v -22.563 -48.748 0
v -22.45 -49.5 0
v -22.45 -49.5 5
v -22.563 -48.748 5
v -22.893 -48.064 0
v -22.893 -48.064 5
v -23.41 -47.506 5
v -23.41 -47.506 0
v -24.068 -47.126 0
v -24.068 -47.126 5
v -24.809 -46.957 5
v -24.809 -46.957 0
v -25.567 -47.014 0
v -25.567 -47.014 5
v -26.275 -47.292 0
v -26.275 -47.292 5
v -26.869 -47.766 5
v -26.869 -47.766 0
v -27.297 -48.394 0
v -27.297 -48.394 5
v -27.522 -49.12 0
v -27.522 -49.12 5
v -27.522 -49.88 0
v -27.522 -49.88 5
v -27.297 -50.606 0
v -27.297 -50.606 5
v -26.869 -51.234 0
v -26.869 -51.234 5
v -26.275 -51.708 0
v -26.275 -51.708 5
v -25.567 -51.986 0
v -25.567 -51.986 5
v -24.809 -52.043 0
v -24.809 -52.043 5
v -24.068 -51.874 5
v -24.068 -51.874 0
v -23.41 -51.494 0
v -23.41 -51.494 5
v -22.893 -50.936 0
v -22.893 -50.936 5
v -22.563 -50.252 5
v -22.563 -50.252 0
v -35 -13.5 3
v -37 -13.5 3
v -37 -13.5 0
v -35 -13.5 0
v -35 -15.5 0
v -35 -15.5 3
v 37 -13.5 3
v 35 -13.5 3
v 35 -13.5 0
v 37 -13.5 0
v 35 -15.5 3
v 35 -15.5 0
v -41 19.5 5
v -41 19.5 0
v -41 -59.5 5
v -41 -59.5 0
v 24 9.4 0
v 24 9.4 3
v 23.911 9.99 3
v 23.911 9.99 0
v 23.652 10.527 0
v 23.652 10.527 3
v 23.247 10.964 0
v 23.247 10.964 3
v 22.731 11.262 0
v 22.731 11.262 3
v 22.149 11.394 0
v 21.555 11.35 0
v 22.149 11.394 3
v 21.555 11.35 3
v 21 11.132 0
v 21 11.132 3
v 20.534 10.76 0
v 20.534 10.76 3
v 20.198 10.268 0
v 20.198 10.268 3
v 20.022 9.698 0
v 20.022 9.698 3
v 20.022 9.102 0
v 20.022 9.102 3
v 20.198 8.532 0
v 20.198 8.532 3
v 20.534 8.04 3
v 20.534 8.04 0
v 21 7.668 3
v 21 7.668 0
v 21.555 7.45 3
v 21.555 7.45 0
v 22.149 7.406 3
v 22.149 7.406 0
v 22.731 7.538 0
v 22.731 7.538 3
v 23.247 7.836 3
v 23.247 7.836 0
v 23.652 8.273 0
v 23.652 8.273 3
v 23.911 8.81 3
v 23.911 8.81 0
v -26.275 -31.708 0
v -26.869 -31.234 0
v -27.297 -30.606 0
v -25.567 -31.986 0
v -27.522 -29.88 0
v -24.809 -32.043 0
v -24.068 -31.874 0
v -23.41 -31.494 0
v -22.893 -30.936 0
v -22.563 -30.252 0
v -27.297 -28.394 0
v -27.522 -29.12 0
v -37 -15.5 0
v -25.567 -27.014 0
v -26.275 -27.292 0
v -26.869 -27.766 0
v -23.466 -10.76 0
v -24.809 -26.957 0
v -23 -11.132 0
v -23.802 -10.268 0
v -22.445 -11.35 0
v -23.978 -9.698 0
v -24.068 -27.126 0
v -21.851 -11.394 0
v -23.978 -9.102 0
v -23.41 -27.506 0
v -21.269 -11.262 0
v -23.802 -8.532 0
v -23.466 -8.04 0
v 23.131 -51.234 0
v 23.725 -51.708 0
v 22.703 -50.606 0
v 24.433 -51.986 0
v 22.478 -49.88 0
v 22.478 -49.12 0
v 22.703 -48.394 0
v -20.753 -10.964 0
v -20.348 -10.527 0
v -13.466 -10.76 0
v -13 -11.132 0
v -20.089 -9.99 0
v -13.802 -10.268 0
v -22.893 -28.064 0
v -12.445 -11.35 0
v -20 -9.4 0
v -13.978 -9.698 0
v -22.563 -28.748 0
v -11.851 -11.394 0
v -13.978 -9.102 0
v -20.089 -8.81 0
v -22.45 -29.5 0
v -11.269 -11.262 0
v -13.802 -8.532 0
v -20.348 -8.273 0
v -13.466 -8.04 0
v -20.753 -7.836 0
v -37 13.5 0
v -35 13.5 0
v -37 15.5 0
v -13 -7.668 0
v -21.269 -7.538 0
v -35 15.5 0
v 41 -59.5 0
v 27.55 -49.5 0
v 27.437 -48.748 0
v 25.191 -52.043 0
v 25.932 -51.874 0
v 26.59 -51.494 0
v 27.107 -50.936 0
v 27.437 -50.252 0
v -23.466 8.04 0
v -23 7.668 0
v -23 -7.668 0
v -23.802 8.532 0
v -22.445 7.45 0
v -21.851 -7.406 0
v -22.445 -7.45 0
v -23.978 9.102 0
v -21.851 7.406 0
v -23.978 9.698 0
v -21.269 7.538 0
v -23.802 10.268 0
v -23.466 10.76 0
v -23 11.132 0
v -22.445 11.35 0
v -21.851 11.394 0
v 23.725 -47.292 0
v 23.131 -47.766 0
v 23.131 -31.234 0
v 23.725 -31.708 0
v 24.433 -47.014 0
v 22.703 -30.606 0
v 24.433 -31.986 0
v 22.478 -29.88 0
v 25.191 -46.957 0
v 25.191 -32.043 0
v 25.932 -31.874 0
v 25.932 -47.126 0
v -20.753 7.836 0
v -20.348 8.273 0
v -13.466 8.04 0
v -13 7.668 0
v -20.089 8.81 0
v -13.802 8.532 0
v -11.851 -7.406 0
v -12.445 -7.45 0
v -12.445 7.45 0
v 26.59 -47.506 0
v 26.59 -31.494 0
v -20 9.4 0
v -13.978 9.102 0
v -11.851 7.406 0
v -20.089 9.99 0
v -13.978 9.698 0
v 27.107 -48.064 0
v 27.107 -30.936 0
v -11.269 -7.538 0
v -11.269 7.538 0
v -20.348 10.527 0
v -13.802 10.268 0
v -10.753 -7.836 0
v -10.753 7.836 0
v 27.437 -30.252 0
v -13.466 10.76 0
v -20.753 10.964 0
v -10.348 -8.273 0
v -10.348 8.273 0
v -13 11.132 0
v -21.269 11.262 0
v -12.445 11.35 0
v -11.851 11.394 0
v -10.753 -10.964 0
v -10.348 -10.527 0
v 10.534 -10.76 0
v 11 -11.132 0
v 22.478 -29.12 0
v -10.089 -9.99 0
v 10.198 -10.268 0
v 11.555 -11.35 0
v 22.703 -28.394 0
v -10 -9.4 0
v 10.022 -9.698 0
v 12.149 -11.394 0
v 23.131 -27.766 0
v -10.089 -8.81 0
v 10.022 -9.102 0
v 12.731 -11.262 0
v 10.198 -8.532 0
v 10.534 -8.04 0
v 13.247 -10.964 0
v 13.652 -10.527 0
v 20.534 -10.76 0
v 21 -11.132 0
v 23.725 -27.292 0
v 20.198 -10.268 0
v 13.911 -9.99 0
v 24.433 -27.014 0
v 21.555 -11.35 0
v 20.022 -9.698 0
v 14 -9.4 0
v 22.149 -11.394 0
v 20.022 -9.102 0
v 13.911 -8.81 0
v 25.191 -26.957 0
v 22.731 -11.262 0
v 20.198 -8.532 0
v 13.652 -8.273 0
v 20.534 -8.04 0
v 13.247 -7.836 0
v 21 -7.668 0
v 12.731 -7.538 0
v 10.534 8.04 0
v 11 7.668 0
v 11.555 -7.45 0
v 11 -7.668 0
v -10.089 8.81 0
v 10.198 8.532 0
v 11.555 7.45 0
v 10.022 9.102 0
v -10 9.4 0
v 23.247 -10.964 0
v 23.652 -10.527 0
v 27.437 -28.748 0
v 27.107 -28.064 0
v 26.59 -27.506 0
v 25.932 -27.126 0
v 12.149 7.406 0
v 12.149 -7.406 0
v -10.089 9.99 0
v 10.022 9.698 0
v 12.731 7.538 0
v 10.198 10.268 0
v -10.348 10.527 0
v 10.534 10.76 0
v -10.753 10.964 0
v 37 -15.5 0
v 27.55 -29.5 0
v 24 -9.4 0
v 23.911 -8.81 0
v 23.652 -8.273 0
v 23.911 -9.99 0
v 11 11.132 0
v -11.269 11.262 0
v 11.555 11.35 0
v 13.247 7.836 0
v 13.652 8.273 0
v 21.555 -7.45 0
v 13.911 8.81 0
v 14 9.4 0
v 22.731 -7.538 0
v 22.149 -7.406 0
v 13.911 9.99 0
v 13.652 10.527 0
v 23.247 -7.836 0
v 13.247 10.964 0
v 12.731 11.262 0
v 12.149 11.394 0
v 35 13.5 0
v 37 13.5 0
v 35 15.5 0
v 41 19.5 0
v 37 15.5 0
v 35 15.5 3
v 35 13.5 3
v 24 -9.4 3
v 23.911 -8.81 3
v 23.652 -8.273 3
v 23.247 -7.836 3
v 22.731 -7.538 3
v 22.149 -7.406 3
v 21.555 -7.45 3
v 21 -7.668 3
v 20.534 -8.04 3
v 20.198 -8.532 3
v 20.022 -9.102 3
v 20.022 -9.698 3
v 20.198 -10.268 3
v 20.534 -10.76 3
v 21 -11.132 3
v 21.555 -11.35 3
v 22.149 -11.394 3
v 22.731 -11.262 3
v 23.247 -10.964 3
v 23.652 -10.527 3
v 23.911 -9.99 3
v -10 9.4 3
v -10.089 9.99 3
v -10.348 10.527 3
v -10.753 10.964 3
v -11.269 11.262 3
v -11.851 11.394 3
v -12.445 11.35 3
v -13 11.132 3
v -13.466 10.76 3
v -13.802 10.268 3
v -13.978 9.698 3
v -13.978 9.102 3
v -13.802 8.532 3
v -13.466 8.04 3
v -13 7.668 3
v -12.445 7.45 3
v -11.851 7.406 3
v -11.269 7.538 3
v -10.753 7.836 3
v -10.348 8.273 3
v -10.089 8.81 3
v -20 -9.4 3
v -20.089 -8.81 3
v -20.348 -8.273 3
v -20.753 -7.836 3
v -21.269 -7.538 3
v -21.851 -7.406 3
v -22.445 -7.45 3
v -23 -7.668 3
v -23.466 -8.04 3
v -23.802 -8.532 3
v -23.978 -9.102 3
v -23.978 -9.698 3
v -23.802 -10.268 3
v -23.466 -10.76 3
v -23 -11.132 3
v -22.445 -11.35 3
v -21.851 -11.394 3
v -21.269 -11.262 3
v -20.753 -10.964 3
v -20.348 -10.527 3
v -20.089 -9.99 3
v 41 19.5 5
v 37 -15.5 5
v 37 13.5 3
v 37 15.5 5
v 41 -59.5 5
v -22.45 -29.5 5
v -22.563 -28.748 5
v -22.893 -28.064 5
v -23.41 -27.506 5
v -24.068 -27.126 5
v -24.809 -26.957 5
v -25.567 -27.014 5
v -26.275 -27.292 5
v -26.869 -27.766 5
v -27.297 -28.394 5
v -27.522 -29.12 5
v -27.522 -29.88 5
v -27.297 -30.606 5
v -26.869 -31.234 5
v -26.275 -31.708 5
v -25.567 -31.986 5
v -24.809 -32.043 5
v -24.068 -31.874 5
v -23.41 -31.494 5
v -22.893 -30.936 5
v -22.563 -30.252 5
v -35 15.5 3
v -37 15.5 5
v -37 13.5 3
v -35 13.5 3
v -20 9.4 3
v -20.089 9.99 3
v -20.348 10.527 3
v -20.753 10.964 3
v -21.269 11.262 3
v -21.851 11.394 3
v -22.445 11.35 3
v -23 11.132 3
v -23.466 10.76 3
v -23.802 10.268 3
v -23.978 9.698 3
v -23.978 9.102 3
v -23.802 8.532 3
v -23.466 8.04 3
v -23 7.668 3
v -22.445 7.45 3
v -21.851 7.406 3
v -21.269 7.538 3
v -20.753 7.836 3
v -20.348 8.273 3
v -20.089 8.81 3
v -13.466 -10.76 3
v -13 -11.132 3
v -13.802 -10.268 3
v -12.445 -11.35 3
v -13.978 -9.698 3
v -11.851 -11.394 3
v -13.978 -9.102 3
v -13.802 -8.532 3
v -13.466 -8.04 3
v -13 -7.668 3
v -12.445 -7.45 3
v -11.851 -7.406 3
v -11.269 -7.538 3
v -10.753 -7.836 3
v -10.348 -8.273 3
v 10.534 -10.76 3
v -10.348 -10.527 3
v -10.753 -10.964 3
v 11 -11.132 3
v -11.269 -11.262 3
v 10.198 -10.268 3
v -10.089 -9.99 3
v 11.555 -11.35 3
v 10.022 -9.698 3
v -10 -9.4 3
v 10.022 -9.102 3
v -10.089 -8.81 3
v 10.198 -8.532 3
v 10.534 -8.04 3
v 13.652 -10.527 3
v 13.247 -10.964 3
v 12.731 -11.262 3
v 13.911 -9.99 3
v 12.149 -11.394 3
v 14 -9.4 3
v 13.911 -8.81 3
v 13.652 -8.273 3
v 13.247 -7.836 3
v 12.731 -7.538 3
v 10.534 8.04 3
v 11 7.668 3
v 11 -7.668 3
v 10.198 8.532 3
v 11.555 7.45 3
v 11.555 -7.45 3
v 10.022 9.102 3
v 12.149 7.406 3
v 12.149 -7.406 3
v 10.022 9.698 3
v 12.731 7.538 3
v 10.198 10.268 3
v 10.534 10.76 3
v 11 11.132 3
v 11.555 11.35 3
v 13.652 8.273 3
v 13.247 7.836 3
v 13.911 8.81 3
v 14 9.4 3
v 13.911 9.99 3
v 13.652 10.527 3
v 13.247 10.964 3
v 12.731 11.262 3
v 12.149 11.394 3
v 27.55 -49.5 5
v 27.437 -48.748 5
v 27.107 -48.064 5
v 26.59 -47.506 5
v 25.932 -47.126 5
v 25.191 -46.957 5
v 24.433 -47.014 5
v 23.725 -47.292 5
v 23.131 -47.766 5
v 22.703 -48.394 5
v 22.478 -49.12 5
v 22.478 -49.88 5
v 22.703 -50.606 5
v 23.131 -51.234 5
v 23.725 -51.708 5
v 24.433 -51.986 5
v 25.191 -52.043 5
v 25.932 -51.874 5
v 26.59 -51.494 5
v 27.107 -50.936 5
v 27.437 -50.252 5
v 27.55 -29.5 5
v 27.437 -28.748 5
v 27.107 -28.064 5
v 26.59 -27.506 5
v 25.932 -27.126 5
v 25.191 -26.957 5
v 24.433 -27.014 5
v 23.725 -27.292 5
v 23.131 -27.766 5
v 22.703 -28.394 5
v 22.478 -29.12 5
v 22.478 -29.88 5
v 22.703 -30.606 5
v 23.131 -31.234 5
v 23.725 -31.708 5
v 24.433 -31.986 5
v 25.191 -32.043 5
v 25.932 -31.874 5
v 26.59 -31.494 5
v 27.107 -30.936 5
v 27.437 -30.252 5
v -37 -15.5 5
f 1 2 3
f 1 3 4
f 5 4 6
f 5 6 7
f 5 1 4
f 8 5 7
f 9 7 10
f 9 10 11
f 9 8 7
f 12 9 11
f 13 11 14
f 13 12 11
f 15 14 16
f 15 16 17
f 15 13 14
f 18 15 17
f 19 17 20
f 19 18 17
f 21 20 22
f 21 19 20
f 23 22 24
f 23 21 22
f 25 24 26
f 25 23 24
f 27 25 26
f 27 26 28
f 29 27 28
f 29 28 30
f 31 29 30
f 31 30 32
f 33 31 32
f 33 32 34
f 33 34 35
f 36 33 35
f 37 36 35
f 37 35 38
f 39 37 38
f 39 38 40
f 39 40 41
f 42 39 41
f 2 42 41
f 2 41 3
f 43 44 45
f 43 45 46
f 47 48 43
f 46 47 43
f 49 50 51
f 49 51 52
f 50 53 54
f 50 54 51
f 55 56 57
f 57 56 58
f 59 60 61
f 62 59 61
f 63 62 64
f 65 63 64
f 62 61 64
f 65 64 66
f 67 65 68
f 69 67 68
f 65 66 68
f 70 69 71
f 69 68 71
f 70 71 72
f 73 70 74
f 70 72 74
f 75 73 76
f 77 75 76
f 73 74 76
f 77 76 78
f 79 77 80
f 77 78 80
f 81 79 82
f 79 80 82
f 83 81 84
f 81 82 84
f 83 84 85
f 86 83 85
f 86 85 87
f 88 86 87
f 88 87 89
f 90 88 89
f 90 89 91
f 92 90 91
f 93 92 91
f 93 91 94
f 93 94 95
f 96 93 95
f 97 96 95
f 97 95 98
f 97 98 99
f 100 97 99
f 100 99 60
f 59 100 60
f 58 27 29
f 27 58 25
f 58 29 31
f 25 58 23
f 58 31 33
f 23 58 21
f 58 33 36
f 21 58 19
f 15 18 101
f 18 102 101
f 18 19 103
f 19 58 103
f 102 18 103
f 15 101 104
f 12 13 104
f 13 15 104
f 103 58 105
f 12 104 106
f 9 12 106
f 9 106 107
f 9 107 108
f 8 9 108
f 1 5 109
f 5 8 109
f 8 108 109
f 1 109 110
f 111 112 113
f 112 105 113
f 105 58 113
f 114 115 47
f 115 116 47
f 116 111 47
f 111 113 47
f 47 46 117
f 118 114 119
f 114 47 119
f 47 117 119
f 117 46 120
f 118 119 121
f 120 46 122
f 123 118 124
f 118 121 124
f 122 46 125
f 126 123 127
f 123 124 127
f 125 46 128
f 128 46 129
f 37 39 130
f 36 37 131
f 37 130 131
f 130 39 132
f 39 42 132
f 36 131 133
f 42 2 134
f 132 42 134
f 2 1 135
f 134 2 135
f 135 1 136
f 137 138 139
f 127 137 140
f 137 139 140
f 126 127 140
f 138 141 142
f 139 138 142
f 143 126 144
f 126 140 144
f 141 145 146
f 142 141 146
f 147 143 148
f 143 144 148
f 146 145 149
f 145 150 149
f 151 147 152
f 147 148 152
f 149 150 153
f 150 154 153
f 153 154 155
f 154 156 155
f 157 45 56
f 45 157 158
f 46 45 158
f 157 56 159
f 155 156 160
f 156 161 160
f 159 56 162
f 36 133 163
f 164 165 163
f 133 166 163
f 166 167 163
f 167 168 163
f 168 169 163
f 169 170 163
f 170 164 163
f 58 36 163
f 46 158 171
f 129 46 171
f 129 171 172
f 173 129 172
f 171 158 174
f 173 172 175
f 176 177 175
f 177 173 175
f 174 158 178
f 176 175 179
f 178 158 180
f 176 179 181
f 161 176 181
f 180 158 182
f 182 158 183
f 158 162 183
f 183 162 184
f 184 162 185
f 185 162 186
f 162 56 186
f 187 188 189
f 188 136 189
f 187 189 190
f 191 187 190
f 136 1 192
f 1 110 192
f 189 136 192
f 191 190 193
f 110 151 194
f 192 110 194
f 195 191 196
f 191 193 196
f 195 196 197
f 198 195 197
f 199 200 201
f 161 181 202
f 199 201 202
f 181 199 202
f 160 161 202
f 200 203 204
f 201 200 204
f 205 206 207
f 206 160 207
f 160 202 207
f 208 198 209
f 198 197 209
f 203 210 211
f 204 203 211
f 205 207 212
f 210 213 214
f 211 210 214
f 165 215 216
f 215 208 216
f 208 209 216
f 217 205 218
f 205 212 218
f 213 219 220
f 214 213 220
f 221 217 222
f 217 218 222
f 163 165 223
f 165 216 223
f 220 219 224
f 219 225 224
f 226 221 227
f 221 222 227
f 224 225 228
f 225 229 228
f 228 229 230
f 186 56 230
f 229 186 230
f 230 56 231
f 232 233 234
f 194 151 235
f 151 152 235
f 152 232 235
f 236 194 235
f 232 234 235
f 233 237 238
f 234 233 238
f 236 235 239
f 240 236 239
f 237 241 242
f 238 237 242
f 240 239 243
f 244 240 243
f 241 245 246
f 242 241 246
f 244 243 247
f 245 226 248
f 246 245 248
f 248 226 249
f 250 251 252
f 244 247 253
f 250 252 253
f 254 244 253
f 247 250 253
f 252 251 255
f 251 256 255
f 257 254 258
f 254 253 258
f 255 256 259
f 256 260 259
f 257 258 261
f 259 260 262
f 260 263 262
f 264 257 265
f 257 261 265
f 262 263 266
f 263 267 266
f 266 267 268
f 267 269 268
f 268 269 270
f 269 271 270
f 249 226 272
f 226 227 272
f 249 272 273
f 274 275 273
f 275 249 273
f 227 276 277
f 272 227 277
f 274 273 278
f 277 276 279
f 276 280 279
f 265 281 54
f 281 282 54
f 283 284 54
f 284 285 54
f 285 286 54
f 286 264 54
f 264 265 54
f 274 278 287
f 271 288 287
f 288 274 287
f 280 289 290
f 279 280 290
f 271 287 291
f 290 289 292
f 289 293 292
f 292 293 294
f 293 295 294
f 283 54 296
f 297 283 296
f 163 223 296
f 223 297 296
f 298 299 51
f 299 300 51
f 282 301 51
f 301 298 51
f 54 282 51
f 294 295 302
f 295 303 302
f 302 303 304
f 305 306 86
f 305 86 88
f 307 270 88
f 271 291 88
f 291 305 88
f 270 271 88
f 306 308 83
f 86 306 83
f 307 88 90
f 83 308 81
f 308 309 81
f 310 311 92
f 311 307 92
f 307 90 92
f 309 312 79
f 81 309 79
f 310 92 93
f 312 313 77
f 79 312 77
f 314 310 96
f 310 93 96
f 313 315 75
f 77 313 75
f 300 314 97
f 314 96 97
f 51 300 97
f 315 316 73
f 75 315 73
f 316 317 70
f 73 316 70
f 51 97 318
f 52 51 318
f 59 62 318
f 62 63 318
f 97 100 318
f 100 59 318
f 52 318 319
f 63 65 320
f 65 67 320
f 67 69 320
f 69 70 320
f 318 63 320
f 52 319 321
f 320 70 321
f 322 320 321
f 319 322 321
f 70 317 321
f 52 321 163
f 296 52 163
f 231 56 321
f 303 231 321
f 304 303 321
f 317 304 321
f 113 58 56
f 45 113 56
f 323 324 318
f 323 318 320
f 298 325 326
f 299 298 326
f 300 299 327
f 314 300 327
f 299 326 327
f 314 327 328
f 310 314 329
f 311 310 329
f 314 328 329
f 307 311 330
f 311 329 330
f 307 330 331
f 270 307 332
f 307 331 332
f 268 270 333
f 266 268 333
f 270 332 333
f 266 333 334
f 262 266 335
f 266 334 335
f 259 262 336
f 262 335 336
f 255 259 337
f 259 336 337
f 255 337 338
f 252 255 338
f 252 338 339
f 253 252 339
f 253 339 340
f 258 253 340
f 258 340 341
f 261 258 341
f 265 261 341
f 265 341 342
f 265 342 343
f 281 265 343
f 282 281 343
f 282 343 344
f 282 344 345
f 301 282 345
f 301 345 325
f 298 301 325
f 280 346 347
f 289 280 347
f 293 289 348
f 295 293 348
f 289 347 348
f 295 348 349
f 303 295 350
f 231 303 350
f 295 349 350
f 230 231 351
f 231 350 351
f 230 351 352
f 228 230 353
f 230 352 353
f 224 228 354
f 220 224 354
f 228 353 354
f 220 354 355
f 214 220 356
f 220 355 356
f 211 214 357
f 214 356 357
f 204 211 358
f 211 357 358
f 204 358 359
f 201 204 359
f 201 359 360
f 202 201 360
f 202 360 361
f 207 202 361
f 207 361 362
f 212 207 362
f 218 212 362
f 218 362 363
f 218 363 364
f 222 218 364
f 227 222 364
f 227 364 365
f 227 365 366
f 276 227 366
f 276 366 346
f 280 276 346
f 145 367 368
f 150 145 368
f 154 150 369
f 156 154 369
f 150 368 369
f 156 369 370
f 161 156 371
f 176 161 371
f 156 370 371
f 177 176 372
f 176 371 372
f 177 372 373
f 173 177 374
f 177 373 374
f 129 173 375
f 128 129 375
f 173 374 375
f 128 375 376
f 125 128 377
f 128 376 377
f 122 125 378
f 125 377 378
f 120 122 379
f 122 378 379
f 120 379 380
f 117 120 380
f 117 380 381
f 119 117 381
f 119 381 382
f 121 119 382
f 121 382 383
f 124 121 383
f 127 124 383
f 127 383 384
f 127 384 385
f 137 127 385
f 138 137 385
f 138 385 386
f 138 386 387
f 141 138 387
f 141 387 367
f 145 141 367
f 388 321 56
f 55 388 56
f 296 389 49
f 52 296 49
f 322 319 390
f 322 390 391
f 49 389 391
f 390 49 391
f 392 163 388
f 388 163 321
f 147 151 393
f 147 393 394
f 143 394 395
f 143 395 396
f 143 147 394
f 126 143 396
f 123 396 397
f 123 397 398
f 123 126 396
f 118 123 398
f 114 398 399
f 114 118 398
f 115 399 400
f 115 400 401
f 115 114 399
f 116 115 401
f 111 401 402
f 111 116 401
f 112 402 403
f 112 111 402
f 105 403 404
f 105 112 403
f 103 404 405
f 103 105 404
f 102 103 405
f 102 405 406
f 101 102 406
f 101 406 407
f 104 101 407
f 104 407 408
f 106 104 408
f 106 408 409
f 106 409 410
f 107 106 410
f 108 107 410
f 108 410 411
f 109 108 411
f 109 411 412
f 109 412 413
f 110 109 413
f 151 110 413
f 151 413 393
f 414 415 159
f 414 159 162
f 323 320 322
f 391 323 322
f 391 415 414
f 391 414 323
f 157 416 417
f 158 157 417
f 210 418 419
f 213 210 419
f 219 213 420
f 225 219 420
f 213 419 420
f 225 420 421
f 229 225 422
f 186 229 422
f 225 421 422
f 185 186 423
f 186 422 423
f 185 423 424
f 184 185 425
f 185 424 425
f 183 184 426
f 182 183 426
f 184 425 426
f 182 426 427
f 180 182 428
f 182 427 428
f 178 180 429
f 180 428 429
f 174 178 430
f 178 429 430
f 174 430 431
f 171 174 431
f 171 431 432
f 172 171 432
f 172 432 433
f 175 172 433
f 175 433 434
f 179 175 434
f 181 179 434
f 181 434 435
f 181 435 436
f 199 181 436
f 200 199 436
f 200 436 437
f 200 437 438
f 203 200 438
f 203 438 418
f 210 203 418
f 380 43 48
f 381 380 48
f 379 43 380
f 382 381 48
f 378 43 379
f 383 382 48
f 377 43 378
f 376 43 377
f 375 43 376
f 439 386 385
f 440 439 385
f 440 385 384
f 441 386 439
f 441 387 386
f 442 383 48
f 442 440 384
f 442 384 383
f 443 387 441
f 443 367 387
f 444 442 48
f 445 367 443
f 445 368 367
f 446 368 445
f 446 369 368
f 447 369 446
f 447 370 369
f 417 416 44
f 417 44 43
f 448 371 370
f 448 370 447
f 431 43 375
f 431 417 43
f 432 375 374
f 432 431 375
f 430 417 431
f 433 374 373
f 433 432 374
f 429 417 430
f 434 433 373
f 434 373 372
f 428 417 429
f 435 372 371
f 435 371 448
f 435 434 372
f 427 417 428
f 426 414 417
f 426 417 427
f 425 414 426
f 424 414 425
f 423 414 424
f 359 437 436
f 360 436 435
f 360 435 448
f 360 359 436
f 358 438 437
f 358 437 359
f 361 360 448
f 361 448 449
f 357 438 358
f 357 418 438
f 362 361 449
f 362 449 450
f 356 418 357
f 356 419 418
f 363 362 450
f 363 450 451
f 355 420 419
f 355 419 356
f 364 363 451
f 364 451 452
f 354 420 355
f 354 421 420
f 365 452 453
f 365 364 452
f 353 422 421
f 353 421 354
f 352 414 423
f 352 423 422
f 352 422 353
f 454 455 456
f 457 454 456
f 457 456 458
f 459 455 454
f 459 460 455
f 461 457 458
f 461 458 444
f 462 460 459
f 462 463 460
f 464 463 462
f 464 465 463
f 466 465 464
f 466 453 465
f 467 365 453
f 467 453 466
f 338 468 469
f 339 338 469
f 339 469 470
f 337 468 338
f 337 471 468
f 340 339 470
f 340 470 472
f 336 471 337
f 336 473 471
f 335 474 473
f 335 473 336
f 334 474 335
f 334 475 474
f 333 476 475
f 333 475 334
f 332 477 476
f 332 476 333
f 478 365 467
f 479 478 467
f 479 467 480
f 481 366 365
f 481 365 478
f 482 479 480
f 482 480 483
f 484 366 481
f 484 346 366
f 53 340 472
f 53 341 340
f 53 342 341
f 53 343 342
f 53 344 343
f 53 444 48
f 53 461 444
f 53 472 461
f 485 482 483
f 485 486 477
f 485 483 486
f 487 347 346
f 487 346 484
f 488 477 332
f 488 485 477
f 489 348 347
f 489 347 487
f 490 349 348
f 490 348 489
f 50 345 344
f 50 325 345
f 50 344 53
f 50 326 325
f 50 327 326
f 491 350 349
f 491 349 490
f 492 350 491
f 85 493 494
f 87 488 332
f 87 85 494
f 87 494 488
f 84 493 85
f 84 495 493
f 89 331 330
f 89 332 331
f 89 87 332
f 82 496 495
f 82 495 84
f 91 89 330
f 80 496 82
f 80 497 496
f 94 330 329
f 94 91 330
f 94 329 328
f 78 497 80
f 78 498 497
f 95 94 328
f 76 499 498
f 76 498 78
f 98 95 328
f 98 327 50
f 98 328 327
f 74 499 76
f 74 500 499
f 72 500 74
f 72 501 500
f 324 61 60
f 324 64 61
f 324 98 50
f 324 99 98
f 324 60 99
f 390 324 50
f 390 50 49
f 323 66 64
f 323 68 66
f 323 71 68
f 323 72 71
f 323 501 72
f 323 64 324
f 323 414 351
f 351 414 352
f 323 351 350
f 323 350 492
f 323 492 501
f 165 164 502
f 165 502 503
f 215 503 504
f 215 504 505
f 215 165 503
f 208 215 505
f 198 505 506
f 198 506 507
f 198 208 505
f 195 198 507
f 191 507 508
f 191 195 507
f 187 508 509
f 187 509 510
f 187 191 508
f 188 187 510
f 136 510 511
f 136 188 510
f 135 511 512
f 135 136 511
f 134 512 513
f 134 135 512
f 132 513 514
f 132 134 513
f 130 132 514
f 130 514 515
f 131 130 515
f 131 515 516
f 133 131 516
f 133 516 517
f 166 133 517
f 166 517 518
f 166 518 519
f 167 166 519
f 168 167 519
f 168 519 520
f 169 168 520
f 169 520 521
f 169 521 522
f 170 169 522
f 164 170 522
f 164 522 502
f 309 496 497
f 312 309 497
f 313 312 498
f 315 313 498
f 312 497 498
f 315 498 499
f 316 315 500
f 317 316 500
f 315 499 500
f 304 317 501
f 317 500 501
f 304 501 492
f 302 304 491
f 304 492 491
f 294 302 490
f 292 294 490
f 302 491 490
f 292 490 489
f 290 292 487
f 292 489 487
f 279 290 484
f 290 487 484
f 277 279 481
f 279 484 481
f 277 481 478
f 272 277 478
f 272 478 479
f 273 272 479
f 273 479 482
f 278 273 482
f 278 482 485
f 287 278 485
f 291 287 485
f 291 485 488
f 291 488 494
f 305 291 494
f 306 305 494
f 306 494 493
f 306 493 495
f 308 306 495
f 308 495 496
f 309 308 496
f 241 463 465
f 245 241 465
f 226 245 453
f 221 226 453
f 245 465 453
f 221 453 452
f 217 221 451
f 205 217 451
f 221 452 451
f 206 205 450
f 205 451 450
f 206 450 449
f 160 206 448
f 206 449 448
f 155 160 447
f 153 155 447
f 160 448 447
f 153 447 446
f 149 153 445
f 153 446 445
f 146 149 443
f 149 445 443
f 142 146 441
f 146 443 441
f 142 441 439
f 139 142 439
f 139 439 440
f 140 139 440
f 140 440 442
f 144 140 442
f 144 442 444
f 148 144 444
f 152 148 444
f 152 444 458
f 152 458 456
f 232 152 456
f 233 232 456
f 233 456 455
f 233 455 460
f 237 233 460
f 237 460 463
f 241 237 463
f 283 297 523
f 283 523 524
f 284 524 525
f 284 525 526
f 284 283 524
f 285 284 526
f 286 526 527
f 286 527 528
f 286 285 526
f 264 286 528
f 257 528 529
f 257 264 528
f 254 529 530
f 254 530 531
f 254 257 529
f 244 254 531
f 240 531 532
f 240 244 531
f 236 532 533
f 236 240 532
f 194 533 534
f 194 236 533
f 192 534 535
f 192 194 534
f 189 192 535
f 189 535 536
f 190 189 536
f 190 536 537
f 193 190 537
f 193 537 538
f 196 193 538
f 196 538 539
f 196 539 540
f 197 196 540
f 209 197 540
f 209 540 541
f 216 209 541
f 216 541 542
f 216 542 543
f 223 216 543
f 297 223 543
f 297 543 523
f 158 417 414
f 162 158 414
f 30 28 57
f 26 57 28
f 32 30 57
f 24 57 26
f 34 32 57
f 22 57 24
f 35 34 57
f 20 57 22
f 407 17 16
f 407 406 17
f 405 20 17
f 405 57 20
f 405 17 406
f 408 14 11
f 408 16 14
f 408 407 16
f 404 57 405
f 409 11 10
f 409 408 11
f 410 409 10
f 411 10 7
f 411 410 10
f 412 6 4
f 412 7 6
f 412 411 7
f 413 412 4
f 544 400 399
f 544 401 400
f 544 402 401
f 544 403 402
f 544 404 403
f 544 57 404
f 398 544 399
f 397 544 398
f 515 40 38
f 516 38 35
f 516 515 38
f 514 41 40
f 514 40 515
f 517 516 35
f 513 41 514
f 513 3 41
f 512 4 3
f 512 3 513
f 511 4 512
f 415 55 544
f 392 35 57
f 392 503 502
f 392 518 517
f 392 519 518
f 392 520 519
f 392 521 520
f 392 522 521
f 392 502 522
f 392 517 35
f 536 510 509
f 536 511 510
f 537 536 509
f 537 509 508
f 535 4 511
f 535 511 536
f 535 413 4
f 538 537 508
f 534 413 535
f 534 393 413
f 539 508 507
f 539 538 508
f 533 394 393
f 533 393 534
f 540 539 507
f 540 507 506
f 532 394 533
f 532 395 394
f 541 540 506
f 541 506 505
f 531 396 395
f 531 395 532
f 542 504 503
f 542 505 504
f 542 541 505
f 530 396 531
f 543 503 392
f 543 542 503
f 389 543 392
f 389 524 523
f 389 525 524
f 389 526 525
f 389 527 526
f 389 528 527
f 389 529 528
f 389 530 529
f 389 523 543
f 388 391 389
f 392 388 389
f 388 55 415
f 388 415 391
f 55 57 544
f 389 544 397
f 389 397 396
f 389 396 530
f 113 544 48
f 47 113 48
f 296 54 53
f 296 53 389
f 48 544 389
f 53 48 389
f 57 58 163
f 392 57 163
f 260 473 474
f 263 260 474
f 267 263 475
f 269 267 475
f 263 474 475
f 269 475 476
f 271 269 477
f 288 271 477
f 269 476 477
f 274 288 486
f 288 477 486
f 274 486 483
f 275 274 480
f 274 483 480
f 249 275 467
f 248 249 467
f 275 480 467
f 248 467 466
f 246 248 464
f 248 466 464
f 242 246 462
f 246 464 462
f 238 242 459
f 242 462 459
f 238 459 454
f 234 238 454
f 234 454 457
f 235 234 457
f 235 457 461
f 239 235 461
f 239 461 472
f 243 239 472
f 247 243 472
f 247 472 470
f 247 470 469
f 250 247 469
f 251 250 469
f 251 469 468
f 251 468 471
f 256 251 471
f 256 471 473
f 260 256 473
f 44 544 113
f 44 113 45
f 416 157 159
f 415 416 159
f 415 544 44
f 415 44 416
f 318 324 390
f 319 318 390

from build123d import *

# Parameters (mm, degrees)
SKETCH1_R           = 2.55
BOSS_EXTRUDE1_DEPTH = 5
SKETCH3_R           = 2.55
SKETCH3_W           = 74
SKETCH3_H           = 31
CUT_EXTRUDE1_DEPTH  = 2
SKETCH4_R           = 2
SKETCH4_W           = 2
SKETCH4_H           = 2
CUT_EXTRUDE2_DEPTH  = 5


with BuildPart() as part:
    # Sketch1 → Boss-Extrude1 (new body)
    with BuildSketch(Plane.XY):
        Polygon((-41, -19.5), (-41, -59.5), (41, -59.5), (41, -19.5), (41, 19.5), (-41, 19.5), align=None)
        with Locations((-25, -29.5)):
            Circle(SKETCH1_R, mode=Mode.SUBTRACT)
        with Locations((-25, -49.5)):
            Circle(SKETCH1_R, mode=Mode.SUBTRACT)
        with Locations((25, -49.5)):
            Circle(SKETCH1_R, mode=Mode.SUBTRACT)
        with Locations((25, -29.5)):
            Circle(SKETCH1_R, mode=Mode.SUBTRACT)
    extrude(amount=BOSS_EXTRUDE1_DEPTH)

    # Sketch3 → Cut-Extrude1 (cut)
    with BuildSketch(Plane.XY.offset(5)):
        with Locations((25, -29.5)):
            Circle(SKETCH3_R)
        with Locations((25, -49.5)):
            Circle(SKETCH3_R)
        with Locations((-25, -49.5)):
            Circle(SKETCH3_R)
        with Locations((-25, -29.5)):
            Circle(SKETCH3_R)
        Rectangle(SKETCH3_W, SKETCH3_H)
    extrude(amount=-CUT_EXTRUDE1_DEPTH, mode=Mode.SUBTRACT)

    # Sketch4 → Cut-Extrude2 (cut)
    with BuildSketch(Plane.XY.offset(3)):
        with Locations((-22, 9.4)):
            Circle(SKETCH4_R)
        with Locations((-12, 9.4)):
            Circle(SKETCH4_R)
        with Locations((12, 9.4)):
            Circle(SKETCH4_R)
        with Locations((22, 9.4)):
            Circle(SKETCH4_R)
        with Locations((22, -9.4)):
            Circle(SKETCH4_R)
        with Locations((12, -9.4)):
            Circle(SKETCH4_R)
        with Locations((-12, -9.4)):
            Circle(SKETCH4_R)
        with Locations((-22, -9.4)):
            Circle(SKETCH4_R)
        with Locations((-36, -14.5)):
            Rectangle(SKETCH4_W, SKETCH4_H)
        with Locations((-36, 14.5)):
            Rectangle(SKETCH4_W, SKETCH4_H)
        with Locations((36, 14.5)):
            Rectangle(SKETCH4_W, SKETCH4_H)
        with Locations((36, -14.5)):
            Rectangle(SKETCH4_W, SKETCH4_H)
    extrude(amount=-CUT_EXTRUDE2_DEPTH, mode=Mode.SUBTRACT)


solid = part.part
